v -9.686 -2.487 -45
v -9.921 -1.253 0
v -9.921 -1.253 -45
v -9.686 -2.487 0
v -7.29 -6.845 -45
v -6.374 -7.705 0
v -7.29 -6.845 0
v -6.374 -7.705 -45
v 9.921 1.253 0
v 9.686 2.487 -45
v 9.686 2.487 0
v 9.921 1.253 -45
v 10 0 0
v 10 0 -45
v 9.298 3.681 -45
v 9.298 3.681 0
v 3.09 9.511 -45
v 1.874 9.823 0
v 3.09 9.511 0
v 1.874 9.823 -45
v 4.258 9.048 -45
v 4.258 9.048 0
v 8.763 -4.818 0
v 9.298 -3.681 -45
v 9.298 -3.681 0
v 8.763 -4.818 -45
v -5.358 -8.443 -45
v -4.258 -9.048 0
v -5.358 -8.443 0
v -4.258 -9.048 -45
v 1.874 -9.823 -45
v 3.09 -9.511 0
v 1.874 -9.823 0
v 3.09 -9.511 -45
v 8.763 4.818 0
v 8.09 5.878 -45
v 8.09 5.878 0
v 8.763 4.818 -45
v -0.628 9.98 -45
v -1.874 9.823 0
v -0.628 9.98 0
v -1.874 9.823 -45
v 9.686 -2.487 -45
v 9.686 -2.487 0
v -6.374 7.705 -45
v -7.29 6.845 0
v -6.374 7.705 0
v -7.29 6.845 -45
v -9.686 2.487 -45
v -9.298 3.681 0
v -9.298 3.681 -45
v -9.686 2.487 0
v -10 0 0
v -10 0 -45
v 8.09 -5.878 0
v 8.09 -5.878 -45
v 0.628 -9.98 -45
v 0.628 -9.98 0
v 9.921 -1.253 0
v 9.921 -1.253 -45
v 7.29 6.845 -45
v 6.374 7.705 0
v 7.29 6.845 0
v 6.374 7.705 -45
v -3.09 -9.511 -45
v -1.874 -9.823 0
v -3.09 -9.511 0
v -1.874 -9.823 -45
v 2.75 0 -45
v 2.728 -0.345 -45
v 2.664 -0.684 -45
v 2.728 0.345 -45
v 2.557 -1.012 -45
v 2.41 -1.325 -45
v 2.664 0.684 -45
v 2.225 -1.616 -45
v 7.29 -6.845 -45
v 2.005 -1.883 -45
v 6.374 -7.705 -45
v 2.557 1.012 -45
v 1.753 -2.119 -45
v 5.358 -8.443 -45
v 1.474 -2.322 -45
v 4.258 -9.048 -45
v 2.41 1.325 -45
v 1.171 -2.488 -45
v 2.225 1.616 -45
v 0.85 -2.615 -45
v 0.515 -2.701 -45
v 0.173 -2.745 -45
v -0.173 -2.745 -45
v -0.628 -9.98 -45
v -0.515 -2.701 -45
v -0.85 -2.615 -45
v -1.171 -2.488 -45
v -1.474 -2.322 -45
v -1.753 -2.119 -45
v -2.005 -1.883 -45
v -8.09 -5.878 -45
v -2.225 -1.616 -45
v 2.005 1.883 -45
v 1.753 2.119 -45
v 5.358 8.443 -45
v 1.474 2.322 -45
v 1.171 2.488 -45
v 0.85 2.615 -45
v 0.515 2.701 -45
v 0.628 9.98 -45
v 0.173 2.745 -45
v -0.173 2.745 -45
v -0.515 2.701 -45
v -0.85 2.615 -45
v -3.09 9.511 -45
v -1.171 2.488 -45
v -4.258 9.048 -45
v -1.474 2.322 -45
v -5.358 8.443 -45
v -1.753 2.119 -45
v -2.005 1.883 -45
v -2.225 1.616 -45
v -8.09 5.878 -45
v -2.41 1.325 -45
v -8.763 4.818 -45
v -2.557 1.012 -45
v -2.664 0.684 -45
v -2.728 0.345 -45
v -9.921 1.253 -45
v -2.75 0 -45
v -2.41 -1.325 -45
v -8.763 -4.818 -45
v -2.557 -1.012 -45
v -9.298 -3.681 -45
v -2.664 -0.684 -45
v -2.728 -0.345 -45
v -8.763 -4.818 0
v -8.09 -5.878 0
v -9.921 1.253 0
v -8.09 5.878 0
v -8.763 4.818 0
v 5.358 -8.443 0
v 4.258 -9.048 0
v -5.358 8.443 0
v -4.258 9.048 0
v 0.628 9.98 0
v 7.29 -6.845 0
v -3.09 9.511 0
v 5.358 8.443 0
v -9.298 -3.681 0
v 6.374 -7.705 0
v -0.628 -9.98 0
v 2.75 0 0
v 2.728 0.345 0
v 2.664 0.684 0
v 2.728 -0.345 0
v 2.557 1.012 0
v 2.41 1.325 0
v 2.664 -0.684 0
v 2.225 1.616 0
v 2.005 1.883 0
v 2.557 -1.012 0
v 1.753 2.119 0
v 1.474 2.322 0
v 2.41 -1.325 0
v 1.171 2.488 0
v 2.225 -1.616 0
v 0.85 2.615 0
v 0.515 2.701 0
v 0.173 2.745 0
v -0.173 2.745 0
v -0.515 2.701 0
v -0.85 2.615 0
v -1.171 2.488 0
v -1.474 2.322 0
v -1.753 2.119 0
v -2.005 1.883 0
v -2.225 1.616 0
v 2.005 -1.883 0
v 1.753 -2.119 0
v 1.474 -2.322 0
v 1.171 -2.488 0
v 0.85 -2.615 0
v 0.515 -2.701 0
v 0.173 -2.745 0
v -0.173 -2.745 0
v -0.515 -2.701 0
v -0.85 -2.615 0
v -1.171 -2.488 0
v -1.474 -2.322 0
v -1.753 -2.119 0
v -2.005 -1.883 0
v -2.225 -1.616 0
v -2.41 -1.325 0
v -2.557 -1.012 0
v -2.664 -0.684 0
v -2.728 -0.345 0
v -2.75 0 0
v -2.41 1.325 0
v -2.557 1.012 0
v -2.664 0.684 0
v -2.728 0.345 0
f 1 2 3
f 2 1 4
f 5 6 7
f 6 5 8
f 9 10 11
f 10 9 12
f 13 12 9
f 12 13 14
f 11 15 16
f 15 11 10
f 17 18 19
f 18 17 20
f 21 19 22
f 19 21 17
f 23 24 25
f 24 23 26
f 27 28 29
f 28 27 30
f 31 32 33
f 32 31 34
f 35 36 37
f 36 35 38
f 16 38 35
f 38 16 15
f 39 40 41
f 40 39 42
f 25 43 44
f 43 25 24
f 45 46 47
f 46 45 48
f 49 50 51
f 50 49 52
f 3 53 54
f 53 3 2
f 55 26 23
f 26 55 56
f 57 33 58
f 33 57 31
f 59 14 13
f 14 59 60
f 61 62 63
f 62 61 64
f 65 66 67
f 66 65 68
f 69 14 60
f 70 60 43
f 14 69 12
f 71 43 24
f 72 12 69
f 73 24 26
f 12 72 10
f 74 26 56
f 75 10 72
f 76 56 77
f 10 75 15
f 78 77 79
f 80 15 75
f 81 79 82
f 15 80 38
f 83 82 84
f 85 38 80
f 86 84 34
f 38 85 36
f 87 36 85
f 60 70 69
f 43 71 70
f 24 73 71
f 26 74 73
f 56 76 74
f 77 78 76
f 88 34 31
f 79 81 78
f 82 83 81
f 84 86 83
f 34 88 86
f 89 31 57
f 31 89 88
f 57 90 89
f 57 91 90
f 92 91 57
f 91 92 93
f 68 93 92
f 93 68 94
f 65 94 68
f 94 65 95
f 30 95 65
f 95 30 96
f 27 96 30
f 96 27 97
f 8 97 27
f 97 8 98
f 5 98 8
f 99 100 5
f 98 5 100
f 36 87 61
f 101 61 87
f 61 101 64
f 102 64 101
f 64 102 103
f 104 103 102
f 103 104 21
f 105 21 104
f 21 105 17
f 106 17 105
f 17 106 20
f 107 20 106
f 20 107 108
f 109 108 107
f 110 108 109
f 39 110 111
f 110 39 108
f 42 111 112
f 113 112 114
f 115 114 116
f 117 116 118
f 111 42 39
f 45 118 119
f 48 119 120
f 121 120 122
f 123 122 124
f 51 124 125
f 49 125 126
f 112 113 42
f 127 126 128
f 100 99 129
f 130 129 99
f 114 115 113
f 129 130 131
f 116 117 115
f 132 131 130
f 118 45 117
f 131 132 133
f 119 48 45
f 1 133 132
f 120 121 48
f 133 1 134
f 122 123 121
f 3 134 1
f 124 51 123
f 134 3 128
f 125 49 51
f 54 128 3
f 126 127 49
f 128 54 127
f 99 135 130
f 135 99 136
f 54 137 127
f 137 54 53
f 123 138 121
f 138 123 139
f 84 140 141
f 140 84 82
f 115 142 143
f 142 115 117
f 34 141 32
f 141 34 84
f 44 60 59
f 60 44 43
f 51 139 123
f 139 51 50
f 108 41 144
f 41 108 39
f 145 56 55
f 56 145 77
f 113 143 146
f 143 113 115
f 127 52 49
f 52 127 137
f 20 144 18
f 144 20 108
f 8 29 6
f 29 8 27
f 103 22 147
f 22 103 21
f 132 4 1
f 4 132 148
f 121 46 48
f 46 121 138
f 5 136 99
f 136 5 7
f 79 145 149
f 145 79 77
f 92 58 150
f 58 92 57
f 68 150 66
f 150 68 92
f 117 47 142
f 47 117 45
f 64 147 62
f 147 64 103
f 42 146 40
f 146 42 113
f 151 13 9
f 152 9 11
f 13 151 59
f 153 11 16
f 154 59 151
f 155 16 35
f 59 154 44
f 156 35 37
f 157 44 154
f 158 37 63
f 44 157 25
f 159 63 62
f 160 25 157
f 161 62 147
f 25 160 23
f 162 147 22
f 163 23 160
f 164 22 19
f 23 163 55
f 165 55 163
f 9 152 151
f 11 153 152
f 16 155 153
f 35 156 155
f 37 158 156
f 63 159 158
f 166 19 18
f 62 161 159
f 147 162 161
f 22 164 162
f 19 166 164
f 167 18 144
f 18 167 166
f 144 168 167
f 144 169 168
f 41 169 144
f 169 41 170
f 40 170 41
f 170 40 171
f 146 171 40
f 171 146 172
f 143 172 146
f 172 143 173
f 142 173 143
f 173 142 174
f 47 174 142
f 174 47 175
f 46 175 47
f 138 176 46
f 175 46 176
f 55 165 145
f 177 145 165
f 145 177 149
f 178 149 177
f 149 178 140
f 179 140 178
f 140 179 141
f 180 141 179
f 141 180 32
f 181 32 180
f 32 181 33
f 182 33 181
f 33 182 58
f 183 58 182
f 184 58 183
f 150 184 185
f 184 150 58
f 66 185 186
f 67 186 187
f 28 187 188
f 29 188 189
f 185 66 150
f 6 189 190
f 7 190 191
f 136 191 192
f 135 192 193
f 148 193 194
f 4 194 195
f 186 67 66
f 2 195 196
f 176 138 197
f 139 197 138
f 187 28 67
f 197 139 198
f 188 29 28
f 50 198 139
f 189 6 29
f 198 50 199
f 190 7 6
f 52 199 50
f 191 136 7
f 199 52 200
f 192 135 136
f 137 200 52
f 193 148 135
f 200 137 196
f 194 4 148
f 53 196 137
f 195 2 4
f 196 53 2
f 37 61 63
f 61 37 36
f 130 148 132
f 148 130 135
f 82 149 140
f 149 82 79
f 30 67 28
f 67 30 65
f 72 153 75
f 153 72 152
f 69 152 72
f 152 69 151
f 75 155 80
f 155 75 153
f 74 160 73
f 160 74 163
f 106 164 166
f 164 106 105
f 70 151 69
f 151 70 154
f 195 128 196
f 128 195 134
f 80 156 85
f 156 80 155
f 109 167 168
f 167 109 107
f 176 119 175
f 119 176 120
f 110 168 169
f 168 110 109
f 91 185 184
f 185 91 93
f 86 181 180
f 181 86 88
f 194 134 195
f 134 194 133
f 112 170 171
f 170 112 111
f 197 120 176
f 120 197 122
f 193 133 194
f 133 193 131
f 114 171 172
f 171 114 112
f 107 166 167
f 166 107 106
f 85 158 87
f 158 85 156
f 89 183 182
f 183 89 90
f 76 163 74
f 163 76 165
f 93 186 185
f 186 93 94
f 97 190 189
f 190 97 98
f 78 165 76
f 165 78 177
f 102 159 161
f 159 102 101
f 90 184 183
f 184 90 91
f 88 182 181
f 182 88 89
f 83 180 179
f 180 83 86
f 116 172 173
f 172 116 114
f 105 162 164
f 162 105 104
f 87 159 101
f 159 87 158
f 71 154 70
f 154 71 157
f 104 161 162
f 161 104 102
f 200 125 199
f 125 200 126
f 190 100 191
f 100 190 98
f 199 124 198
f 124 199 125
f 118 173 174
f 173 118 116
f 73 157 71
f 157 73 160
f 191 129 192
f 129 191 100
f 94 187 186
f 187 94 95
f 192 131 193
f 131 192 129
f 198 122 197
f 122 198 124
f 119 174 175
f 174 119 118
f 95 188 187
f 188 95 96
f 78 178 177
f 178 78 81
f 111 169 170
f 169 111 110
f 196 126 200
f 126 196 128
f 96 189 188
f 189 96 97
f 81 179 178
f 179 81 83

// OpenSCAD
$fn = 50;


difference() {
	union() {
		translate(v = [0, 0, -45.0000000000]) {
			cylinder(h = 45, r = 10.0000000000);
		}
		cylinder(h = 0, r = 20.0000000000);
	}
	union() {
		#translate(v = [0, 0, -45]) {
			cylinder(h = 45, r = 2.7500000000);
		}
	}
}
